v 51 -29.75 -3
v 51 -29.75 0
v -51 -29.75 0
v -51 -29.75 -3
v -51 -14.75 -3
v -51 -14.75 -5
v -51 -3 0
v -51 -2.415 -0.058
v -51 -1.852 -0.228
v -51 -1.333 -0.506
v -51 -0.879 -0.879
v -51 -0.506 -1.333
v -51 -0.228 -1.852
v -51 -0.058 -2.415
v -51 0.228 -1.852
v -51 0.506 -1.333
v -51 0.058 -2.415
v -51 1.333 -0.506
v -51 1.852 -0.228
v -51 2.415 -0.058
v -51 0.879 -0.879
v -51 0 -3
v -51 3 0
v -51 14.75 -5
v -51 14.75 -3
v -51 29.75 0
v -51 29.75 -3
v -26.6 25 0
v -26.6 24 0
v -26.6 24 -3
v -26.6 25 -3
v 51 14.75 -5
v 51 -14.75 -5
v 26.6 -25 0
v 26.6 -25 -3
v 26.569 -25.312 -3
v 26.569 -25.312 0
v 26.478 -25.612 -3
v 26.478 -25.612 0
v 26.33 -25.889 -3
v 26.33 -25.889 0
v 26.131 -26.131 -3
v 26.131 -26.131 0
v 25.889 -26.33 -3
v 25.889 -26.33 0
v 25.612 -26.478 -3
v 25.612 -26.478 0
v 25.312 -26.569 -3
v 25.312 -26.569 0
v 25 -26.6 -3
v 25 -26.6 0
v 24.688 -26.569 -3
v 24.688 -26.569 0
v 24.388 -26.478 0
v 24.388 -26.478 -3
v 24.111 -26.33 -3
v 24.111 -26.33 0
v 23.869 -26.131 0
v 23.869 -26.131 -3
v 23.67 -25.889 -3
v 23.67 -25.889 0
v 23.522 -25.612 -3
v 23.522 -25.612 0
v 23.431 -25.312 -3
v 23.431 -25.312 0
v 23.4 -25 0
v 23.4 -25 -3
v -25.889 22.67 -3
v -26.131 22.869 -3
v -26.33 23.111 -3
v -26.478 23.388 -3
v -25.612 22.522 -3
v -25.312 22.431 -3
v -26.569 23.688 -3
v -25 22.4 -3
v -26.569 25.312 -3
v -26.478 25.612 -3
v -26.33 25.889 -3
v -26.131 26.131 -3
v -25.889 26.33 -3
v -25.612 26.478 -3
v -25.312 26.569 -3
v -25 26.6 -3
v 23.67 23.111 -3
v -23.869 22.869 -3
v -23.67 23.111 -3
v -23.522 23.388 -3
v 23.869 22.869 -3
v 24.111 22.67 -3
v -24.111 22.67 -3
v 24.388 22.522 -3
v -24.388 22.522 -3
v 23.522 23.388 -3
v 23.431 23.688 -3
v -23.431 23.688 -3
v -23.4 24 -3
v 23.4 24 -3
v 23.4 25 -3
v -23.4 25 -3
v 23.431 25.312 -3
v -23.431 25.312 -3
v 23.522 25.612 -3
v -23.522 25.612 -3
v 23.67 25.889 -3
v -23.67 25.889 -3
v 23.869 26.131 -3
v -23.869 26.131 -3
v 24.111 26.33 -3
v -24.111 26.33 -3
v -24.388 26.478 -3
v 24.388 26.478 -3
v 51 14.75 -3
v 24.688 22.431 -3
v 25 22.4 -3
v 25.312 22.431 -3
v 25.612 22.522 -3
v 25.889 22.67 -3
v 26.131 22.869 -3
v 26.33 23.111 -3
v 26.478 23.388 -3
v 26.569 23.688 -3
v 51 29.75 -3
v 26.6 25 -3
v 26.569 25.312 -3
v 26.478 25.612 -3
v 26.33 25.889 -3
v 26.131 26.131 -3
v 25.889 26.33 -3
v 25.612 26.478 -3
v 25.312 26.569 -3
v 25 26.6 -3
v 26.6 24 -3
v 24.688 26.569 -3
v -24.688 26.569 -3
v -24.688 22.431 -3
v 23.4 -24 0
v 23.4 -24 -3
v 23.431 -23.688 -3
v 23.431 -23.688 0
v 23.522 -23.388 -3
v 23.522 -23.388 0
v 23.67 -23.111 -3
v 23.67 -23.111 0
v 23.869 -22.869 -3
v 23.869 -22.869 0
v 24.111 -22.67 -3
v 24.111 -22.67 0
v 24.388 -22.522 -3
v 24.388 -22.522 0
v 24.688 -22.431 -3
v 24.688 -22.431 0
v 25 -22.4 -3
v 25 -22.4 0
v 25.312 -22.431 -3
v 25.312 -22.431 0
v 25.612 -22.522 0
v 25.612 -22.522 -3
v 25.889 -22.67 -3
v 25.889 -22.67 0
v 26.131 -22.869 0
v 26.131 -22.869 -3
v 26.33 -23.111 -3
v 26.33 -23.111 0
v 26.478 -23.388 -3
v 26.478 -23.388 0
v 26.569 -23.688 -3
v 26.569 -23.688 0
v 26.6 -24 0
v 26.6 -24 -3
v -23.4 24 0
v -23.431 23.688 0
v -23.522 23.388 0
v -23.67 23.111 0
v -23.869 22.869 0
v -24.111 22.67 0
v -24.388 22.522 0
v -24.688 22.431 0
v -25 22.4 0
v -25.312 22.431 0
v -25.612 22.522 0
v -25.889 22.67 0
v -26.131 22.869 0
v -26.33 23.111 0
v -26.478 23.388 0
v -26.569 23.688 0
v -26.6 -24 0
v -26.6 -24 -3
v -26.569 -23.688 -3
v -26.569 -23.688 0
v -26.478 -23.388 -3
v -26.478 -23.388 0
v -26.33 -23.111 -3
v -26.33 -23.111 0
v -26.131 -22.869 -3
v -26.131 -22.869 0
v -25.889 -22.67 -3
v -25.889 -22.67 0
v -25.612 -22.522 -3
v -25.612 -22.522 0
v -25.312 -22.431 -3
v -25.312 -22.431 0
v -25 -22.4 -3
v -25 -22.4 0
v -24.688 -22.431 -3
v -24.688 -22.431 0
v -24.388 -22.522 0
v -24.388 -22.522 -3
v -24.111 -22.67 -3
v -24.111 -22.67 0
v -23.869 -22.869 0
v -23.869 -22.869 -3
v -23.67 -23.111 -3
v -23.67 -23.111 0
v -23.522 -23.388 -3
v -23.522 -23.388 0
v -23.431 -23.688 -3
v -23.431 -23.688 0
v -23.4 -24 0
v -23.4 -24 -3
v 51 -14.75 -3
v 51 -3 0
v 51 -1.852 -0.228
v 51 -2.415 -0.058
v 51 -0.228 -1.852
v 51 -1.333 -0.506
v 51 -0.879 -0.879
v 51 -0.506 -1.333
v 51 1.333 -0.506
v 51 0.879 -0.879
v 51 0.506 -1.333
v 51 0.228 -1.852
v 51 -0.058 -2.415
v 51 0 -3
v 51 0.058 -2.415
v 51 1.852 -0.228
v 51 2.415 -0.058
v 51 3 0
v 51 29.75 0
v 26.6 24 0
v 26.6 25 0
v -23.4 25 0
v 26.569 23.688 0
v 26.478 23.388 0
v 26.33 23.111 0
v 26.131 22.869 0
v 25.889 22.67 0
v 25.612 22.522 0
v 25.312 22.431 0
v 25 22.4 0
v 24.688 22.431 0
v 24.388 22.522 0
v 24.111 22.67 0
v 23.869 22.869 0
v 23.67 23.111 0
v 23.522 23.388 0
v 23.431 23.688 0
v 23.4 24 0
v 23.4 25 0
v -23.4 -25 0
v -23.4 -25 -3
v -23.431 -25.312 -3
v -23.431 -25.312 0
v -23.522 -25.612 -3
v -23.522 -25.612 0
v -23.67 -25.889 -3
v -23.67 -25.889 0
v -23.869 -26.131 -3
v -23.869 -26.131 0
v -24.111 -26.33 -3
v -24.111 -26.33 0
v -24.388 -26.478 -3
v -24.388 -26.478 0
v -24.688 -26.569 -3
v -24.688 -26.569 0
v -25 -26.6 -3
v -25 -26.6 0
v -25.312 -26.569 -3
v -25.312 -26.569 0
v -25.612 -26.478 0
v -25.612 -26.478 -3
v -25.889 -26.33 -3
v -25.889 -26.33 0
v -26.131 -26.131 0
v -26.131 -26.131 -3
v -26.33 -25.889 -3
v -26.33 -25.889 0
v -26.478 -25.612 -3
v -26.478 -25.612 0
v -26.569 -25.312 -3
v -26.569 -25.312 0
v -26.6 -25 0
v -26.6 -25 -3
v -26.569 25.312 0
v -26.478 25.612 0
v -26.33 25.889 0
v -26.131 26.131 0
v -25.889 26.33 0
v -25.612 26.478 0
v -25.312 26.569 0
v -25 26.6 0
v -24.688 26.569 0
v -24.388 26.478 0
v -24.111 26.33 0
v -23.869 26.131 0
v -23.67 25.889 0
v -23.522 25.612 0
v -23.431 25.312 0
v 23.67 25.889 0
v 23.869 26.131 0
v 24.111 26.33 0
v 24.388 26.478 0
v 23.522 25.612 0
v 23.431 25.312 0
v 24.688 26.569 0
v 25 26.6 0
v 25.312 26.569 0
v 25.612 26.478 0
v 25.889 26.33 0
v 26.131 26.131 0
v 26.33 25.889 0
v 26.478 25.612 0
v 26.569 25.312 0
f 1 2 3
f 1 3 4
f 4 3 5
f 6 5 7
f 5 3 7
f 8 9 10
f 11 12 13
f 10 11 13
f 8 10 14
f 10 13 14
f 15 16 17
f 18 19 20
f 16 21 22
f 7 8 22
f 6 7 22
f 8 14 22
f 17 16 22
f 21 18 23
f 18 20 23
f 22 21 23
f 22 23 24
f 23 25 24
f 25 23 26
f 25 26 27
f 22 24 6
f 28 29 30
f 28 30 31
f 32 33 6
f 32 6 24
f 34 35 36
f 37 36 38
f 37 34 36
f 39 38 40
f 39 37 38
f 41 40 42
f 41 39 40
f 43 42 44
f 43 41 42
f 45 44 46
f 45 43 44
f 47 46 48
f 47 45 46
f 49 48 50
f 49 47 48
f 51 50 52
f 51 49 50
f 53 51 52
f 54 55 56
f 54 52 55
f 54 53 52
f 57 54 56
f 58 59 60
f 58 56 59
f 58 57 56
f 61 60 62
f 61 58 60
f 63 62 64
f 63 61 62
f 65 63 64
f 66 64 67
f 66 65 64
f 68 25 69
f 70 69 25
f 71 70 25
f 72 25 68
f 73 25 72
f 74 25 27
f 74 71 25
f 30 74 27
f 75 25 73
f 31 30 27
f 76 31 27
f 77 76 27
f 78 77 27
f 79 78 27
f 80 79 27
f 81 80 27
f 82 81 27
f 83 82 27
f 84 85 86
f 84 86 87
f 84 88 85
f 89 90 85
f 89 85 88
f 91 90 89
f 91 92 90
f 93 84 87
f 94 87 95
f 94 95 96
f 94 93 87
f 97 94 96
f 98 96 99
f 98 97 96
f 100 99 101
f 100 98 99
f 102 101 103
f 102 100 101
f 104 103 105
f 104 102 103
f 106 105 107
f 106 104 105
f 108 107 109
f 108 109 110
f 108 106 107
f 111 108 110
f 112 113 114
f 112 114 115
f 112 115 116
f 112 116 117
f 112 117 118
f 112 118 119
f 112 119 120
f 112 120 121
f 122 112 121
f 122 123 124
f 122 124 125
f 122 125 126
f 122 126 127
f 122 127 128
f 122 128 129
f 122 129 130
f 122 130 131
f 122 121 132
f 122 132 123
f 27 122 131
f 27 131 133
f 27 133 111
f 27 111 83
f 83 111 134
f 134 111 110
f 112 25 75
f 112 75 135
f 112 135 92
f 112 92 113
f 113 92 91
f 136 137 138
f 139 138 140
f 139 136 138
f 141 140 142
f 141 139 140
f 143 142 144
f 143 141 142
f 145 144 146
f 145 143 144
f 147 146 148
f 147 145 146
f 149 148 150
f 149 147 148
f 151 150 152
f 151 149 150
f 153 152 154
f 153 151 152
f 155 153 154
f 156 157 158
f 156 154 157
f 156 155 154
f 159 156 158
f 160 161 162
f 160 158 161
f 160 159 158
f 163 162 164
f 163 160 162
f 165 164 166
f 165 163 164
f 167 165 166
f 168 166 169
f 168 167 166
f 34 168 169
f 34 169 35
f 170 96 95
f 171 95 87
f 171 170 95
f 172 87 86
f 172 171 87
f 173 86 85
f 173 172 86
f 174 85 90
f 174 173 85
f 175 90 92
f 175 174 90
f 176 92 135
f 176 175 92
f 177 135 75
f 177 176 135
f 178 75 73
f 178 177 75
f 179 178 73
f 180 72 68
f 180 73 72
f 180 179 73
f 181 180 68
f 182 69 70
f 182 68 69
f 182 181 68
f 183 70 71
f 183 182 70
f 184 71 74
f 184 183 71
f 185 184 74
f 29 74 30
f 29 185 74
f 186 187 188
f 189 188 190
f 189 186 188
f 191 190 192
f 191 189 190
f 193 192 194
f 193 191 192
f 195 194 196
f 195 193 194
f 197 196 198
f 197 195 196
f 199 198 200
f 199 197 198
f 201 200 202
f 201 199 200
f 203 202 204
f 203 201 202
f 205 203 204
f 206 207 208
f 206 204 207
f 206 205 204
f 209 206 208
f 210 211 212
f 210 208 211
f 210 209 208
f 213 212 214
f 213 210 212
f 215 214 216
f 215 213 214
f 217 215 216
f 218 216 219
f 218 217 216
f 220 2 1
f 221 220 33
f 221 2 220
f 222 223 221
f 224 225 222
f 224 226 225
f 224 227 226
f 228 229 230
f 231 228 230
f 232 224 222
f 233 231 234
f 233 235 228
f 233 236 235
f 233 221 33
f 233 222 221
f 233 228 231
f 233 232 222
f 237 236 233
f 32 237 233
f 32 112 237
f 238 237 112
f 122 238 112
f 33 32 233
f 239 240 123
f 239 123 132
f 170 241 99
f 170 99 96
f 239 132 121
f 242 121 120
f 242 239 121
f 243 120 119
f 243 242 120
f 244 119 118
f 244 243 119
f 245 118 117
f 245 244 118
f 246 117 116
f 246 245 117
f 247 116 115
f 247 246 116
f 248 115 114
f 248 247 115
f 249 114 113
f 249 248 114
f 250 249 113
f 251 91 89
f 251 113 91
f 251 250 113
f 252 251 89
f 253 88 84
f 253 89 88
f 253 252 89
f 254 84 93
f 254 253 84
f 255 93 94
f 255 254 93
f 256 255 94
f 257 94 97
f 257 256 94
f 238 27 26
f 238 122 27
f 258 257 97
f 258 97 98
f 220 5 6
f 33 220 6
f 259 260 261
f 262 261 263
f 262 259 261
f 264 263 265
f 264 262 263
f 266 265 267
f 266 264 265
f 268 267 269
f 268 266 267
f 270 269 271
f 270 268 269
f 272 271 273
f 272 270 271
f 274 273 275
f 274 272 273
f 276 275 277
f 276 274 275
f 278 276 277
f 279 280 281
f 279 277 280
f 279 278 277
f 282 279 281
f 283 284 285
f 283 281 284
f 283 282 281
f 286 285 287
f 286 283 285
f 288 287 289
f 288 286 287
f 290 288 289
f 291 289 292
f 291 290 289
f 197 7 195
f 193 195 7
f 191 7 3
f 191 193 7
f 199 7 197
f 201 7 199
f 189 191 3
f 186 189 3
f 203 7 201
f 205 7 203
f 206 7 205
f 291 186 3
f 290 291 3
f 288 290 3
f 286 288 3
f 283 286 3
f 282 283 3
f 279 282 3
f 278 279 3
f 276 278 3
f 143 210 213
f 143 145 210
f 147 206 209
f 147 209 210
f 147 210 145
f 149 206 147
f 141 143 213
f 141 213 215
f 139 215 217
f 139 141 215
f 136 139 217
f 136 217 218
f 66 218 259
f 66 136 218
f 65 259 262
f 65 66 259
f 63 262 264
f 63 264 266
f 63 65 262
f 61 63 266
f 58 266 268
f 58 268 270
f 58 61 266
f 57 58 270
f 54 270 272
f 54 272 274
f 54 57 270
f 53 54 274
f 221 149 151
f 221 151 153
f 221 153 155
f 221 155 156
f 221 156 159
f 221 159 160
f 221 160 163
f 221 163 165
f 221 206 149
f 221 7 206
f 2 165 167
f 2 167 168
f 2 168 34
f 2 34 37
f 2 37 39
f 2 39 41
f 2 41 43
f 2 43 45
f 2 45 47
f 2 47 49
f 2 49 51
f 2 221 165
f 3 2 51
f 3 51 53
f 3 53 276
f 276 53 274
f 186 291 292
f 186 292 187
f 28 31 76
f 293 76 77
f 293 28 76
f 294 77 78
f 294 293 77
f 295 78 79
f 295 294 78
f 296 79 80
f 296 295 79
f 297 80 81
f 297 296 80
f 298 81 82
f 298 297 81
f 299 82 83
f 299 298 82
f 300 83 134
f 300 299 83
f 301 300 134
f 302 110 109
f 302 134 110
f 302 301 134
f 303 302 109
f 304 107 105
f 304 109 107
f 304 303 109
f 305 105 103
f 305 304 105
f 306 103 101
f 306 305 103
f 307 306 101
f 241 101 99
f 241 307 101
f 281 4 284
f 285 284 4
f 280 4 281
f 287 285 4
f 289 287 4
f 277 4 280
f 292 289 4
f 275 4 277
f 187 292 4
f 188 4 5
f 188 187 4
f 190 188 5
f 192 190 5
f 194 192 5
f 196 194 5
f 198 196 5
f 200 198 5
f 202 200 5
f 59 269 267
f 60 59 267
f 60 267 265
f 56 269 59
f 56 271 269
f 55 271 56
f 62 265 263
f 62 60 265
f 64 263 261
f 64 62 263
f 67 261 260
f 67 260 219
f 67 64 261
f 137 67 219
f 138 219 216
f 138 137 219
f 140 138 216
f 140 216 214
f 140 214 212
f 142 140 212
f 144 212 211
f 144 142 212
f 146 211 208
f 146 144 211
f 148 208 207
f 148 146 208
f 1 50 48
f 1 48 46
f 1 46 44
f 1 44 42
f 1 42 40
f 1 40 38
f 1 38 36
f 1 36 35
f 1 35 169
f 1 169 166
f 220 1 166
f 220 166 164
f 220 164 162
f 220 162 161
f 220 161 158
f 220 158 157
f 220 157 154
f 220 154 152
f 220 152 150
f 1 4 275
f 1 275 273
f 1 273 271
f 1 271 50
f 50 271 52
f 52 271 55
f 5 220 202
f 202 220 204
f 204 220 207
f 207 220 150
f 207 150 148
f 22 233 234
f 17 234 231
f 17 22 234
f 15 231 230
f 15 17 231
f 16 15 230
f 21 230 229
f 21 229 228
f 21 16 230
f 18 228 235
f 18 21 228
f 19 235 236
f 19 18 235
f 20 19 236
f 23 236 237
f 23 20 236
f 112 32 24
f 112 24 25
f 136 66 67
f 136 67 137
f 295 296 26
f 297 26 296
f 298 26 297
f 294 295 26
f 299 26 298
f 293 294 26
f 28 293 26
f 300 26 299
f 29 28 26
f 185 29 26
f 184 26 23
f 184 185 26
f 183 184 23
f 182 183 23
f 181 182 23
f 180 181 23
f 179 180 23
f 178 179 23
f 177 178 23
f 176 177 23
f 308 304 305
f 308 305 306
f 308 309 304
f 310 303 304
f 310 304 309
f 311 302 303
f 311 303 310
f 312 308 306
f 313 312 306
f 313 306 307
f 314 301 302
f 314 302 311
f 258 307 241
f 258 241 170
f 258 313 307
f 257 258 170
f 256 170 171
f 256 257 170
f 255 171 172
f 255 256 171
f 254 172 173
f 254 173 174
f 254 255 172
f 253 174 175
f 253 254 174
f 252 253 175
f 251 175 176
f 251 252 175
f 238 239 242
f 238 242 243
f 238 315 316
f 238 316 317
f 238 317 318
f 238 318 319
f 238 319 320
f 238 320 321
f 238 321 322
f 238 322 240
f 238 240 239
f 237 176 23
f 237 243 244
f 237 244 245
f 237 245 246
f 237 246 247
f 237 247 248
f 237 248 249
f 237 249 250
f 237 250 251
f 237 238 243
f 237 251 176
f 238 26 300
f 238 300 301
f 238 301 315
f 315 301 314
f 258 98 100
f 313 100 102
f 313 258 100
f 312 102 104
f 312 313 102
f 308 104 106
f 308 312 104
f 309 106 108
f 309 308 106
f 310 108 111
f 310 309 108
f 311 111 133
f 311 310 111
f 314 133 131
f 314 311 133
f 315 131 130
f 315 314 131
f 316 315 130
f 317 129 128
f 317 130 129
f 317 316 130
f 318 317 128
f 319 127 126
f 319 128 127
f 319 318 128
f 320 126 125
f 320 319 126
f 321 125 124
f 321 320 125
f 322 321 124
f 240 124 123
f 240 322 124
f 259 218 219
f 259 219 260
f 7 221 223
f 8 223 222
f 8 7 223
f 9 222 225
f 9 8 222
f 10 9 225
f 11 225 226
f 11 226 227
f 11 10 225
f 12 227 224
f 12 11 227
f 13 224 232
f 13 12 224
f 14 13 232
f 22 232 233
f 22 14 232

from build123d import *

# Parameters (mm, degrees)
BOSS_EXTRUDE1_DEPTH = 51
CUT_EXTRUDE1_DEPTH  = 6
GREEBLE1_DEPTH      = 52
GREEBLE1_DEPTH_BACK = 52


with BuildPart() as part:
    # Sketch1 → Boss-Extrude1 (new body, symmetric)
    with BuildSketch(Plane(origin=(0, 0, 0), x_dir=(0, 0, -1), z_dir=(1, 0, 0))):
        Polygon((0, 29.75), (0, -29.75), (3, -29.75), (3, -14.75), (5, -14.75), (5, 14.75), (3, 14.75), (3, 29.75), align=None)
    extrude(amount=BOSS_EXTRUDE1_DEPTH, both=True)

    # Sketch3 → Cut-Extrude1 (cut, through all)
    with BuildSketch(Plane.XY):
        with BuildLine():
            Line((23.4, 24), (23.4, 25))
            ThreePointArc((23.4, 25), (25, 26.6), (26.6, 25))
            Line((26.6, 25), (26.6, 24))
            ThreePointArc((26.6, 24), (25, 22.4), (23.4, 24))
        make_face()
        with BuildLine():
            Line((-26.6, 24), (-26.6, 25))
            ThreePointArc((-26.6, 25), (-25, 26.6), (-23.4, 25))
            Line((-23.4, 25), (-23.4, 24))
            ThreePointArc((-23.4, 24), (-25, 22.4), (-26.6, 24))
        make_face()
        with BuildLine():
            Line((26.6, -24), (26.6, -25))
            ThreePointArc((26.6, -25), (25, -26.6), (23.4, -25))
            Line((23.4, -25), (23.4, -24))
            ThreePointArc((23.4, -24), (25, -22.4), (26.6, -24))
        make_face()
        with BuildLine():
            Line((-23.4, -24), (-23.4, -25))
            ThreePointArc((-23.4, -25), (-25, -26.6), (-26.6, -25))
            Line((-26.6, -25), (-26.6, -24))
            ThreePointArc((-26.6, -24), (-25, -22.4), (-23.4, -24))
        make_face()
    extrude(amount=-CUT_EXTRUDE1_DEPTH, mode=Mode.SUBTRACT)

    # Sketch6 → Greeble1 (cut, two sides)
    with BuildSketch(Plane(origin=(0, 0, 0), x_dir=(0, 0, -1), z_dir=(1, 0, 0))) as greeble1_sk:
        with BuildLine():
            ThreePointArc((3, 0), (0.878679656, 0.878679656), (0, 3))
            Line((0, 3), (0, -3))
            ThreePointArc((0, -3), (0.878679656, -0.878679656), (3, 0))
        make_face()
    extrude(amount=GREEBLE1_DEPTH, mode=Mode.SUBTRACT)
    extrude(greeble1_sk.sketch, amount=-GREEBLE1_DEPTH_BACK, mode=Mode.SUBTRACT)


solid = part.part
